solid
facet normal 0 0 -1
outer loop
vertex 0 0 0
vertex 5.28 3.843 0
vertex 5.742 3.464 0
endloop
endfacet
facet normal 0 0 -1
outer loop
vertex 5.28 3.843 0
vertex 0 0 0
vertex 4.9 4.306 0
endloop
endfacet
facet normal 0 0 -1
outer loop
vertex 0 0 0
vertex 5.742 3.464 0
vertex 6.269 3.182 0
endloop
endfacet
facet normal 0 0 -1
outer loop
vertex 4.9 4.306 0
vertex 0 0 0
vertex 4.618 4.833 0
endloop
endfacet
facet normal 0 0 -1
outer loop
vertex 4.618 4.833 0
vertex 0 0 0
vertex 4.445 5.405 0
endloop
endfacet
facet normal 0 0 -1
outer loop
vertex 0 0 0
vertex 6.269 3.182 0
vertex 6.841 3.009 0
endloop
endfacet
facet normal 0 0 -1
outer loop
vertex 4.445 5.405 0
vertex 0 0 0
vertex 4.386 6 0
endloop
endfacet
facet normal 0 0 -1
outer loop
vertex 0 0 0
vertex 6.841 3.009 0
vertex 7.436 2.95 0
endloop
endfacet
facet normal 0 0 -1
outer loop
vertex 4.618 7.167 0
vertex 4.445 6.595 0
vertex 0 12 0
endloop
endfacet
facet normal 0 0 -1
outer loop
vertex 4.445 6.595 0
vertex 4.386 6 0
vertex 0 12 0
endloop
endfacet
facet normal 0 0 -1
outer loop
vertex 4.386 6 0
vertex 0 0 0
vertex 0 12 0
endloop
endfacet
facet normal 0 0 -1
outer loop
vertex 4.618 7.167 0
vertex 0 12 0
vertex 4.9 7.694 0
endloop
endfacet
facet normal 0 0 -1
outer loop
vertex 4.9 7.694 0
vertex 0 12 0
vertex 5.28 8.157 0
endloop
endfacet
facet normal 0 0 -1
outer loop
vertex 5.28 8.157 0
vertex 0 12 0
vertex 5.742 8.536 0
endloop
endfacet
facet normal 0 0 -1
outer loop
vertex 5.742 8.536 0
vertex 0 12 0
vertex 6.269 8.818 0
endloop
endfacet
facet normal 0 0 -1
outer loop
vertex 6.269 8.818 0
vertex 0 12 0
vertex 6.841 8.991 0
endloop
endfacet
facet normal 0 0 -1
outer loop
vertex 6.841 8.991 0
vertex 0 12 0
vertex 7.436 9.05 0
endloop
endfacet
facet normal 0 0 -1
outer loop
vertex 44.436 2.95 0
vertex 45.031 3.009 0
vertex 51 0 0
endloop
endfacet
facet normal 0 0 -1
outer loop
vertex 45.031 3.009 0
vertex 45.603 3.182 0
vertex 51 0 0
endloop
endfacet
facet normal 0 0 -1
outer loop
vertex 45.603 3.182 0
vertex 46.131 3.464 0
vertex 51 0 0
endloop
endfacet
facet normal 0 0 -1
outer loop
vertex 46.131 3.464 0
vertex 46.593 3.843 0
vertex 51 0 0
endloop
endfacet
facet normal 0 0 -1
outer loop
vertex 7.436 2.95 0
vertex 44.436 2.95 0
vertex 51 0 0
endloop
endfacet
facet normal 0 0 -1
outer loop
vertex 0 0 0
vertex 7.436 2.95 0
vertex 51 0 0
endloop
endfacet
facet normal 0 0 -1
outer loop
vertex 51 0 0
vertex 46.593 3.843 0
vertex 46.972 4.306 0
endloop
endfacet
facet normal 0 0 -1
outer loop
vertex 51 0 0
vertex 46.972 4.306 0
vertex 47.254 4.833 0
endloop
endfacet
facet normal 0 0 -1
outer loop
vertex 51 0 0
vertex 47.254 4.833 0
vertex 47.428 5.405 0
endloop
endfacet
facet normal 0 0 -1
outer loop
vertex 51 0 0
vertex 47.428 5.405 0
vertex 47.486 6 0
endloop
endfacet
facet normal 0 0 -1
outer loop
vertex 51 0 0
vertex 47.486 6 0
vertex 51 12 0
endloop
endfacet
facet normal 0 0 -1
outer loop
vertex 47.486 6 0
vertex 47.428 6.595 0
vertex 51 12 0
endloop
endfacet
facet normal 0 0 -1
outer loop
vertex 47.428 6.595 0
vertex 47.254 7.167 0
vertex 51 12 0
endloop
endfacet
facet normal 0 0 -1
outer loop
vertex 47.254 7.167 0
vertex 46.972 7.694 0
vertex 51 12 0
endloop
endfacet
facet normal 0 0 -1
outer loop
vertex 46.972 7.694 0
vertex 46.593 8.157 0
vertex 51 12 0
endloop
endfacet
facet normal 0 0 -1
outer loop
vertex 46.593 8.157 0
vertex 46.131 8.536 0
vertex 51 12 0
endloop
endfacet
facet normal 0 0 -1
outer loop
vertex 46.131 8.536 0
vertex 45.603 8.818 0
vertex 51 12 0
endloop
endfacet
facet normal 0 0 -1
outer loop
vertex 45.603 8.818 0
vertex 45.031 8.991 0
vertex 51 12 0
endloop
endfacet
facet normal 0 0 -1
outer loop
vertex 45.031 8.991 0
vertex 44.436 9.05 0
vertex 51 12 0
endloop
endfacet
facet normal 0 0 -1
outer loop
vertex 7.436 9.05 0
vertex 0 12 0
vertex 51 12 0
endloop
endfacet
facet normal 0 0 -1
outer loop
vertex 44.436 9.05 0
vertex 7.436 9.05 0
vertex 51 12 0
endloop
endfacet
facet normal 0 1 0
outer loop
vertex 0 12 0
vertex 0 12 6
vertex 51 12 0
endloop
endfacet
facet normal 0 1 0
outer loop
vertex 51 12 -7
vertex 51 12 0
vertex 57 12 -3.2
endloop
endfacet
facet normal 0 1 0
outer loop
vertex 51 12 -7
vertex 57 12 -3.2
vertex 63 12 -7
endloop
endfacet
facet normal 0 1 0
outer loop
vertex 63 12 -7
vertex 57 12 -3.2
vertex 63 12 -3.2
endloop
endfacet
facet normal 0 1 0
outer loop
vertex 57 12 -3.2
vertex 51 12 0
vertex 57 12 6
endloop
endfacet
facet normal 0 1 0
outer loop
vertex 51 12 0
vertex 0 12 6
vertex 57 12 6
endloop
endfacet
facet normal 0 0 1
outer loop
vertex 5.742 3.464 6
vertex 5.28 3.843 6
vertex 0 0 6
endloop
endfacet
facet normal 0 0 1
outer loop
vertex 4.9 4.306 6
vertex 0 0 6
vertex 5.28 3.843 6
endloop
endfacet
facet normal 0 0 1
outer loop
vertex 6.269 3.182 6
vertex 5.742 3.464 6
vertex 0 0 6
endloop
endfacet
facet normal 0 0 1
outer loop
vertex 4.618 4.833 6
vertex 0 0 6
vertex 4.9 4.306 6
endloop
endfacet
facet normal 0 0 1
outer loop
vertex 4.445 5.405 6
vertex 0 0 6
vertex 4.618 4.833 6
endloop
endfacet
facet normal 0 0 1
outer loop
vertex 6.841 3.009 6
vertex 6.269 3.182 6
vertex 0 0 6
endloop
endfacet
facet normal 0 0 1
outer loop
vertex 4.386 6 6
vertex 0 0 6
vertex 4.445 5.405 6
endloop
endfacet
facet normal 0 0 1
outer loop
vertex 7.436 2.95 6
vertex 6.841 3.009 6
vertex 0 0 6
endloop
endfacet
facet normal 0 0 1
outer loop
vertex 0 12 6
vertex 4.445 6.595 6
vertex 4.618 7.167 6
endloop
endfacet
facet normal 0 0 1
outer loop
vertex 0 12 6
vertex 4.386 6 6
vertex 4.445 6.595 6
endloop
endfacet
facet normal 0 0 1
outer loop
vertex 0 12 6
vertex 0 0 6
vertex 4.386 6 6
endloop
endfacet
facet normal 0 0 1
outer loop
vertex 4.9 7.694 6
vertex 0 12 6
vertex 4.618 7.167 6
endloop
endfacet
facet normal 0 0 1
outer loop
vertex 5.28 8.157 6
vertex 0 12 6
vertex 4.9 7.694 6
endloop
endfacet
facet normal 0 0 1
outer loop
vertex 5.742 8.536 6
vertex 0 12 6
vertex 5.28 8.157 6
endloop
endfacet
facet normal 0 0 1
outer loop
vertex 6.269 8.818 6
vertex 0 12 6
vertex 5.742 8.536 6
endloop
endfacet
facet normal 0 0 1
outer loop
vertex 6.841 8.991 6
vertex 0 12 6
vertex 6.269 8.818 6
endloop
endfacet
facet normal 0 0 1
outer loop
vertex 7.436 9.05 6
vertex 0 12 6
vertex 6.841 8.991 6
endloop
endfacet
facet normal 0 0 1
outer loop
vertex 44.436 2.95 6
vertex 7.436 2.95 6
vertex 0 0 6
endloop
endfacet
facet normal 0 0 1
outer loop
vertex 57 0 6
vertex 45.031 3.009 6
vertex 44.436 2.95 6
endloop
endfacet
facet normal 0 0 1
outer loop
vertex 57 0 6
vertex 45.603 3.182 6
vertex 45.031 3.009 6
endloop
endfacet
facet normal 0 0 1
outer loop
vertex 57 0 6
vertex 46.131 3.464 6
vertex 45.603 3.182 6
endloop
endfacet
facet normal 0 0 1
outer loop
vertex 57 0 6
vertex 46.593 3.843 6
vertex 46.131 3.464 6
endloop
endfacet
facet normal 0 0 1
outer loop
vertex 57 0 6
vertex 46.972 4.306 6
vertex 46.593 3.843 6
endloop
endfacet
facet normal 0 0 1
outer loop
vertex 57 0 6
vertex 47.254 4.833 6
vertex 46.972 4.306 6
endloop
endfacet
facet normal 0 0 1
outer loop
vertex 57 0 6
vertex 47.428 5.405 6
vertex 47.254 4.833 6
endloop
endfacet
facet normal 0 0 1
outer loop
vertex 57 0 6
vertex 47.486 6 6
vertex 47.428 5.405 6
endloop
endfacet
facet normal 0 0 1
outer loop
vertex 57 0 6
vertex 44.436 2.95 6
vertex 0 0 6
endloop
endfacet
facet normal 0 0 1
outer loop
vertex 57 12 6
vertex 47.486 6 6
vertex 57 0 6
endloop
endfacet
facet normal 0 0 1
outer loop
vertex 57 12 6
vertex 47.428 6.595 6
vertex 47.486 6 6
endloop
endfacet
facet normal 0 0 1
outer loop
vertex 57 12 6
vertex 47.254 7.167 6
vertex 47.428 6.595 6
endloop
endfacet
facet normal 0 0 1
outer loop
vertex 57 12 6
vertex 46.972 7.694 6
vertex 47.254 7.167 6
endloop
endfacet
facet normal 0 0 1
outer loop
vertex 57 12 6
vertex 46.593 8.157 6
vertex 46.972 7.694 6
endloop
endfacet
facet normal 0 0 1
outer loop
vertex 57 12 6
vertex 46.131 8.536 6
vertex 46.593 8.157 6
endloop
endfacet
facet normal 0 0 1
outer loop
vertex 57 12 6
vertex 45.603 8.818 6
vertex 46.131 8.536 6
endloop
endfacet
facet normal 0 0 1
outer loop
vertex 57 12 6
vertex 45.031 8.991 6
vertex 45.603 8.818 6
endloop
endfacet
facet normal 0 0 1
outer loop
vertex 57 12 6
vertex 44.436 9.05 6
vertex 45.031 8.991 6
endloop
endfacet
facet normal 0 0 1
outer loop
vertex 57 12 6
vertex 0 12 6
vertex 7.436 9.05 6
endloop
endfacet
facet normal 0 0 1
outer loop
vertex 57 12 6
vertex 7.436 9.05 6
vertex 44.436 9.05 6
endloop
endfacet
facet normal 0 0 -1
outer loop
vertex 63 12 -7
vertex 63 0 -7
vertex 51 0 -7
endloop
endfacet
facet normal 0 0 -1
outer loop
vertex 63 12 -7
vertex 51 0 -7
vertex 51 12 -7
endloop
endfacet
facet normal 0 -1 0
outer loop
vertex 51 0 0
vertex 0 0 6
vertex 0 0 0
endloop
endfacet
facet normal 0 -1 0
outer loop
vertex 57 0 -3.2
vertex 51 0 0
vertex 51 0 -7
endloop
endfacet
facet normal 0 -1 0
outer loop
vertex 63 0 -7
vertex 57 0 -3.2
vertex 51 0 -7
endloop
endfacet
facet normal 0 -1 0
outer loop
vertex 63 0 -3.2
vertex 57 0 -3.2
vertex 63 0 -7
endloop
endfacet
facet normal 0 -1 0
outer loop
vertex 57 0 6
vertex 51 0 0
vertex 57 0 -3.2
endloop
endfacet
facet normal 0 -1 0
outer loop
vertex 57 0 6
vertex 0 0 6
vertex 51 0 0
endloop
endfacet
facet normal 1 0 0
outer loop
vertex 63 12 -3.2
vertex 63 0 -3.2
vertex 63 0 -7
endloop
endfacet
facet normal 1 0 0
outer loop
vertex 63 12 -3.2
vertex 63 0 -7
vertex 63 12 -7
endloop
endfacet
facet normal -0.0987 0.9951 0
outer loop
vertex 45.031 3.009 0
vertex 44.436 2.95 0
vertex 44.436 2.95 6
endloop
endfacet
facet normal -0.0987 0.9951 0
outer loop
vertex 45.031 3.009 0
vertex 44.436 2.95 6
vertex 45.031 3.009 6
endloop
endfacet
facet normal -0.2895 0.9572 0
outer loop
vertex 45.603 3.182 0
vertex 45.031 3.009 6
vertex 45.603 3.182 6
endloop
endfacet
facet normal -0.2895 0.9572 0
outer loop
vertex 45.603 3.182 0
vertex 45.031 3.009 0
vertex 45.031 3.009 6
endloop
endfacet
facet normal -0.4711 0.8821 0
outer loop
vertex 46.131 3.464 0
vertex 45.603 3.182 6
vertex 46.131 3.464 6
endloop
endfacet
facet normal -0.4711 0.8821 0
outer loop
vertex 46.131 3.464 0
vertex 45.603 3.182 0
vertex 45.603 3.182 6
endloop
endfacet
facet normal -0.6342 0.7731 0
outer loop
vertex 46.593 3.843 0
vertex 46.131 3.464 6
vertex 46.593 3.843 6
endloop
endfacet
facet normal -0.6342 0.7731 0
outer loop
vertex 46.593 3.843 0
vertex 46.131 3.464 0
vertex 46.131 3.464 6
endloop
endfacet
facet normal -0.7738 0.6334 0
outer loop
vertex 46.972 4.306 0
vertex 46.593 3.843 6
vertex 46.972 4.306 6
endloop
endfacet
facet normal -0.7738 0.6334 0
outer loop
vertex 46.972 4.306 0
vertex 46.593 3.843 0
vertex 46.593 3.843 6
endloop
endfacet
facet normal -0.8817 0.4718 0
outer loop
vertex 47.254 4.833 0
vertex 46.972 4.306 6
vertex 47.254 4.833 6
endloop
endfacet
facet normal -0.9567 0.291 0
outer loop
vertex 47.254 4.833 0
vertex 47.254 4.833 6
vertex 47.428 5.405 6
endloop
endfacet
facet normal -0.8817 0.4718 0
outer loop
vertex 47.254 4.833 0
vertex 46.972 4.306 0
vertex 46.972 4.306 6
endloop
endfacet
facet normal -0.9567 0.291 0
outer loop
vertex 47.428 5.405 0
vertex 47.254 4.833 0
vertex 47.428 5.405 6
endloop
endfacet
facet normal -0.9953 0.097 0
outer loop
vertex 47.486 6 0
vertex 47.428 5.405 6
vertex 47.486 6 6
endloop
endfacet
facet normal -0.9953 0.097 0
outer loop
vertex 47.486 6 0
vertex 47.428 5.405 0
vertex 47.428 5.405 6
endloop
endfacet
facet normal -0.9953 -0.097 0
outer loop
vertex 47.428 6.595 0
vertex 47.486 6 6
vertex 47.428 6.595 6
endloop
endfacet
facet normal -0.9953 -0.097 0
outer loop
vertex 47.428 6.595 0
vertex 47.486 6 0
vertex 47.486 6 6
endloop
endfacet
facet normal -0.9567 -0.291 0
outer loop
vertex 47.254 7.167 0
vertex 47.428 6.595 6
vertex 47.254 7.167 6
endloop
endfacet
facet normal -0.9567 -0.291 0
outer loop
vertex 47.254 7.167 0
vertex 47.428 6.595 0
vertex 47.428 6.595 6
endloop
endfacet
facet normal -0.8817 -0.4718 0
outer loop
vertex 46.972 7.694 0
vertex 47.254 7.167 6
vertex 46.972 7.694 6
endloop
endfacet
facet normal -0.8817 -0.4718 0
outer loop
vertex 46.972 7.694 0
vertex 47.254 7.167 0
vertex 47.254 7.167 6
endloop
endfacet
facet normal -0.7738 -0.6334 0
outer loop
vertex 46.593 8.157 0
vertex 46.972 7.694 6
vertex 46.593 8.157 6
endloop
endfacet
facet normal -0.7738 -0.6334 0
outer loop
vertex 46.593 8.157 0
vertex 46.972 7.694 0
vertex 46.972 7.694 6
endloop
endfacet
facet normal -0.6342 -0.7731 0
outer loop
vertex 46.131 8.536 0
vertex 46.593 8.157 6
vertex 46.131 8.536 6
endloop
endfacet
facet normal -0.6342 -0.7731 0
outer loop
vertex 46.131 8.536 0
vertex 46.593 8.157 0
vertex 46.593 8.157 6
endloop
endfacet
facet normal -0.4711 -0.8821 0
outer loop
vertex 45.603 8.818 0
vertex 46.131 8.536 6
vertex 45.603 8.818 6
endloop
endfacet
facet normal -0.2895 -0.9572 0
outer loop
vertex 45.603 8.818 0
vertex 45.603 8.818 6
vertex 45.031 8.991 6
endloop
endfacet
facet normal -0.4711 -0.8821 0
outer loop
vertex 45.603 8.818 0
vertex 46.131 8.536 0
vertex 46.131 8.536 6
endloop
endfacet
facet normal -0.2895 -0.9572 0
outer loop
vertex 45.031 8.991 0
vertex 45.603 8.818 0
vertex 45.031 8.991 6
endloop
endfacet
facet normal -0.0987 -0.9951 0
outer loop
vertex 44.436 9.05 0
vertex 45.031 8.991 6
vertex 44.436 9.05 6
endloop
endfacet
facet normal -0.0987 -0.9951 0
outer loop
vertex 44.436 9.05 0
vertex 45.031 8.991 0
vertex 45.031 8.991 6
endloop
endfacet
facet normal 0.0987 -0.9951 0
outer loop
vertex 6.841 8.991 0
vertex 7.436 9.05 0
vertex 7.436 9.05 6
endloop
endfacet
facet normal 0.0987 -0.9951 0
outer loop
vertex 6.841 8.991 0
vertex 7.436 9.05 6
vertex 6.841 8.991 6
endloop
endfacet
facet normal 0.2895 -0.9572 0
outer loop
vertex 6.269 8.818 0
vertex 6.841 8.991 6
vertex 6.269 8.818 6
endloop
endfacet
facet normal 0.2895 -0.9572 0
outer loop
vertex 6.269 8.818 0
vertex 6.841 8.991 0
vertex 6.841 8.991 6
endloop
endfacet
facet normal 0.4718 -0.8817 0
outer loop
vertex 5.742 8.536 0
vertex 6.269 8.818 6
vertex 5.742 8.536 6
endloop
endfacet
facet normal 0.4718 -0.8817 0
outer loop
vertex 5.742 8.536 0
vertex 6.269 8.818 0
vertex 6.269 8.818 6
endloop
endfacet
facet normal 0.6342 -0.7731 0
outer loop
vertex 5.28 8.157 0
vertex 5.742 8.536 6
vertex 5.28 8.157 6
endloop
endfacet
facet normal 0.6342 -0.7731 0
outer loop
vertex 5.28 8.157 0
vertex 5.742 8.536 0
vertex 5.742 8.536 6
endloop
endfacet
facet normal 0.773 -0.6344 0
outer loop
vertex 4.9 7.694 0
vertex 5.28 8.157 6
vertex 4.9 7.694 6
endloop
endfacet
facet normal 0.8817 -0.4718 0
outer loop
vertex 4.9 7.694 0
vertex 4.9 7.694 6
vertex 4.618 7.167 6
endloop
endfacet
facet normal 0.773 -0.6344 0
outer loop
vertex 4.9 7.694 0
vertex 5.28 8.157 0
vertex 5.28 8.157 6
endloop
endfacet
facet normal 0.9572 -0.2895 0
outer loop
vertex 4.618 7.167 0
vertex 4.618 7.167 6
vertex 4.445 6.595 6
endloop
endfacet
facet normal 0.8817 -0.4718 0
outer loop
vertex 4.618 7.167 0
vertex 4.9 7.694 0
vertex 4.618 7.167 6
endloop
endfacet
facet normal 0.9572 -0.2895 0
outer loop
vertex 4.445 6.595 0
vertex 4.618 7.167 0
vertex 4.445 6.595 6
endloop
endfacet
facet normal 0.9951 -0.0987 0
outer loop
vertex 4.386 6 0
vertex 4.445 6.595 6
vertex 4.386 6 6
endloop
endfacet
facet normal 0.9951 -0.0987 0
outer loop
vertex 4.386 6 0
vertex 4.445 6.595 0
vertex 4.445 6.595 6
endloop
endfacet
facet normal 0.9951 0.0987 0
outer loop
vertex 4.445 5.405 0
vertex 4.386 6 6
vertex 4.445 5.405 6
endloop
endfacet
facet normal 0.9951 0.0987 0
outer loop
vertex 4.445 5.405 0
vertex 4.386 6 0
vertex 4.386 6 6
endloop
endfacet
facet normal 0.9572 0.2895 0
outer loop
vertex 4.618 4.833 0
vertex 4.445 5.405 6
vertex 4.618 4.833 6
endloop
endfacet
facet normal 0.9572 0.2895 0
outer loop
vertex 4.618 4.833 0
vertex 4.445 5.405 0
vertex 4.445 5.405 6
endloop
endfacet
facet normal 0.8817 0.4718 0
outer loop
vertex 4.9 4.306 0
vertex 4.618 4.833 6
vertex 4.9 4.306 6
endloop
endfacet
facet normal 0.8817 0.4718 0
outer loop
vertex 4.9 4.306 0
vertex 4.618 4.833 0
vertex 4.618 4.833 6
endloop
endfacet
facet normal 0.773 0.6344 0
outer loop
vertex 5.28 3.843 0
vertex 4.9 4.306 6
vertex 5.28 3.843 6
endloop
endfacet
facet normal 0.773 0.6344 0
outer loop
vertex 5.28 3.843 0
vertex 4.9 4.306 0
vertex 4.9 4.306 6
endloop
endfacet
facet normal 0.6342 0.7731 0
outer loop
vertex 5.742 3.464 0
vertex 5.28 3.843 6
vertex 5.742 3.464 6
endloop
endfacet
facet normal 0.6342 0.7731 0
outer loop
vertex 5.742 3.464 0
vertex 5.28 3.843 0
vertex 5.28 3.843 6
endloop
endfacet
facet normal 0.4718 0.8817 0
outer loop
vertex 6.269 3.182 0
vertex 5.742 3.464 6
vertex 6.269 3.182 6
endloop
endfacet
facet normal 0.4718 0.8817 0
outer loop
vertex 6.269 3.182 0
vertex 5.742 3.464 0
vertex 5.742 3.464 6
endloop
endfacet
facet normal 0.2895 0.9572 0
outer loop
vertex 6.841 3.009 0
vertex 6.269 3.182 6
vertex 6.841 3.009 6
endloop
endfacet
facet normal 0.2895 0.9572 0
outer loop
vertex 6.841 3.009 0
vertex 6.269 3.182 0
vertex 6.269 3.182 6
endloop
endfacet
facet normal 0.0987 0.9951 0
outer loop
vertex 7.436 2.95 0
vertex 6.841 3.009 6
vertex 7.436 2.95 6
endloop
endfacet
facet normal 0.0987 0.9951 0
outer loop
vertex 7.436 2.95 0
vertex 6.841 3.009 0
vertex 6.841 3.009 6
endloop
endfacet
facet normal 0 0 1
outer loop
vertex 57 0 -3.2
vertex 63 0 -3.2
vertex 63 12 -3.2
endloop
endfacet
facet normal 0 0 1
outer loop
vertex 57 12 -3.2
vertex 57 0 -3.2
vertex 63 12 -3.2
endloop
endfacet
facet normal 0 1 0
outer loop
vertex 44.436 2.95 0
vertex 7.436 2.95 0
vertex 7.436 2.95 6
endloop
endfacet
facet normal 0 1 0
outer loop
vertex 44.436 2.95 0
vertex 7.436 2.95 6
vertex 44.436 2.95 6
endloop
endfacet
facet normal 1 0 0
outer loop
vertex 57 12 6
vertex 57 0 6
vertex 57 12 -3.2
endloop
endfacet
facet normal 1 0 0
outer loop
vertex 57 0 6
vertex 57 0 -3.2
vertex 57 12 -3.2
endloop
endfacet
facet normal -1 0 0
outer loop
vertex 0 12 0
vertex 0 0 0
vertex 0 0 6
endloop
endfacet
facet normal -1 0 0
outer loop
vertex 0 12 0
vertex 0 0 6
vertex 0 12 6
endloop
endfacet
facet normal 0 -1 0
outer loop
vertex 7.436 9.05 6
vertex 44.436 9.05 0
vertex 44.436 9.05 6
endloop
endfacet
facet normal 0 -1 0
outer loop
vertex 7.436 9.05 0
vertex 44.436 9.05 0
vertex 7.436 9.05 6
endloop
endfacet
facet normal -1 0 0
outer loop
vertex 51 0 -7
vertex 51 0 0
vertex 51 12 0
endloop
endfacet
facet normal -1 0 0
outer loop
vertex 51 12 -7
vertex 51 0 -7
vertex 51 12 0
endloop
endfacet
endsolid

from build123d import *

# Parameters (mm, degrees)
SKETCH_W     = 57
SKETCH_H     = 12
PAD_DEPTH    = 6
BOX_W        = 12
BOX_H        = 12
BOX_DEPTH    = 7
BOX001_W     = 12
BOX001_H     = 6
BOX001_DEPTH = 3.2


with BuildPart() as part:
    # Sketch → Pad (new body)
    with BuildSketch(Plane.XY):
        with Locations((28.5, 6)):
            Rectangle(SKETCH_W, SKETCH_H)
        with BuildLine():
            Line((44.436229, 9.05), (7.436229, 9.05))
            ThreePointArc((7.436229, 9.05), (4.386229, 6), (7.436229, 2.95))
            Line((7.436229, 2.95), (44.436229, 2.95))
            ThreePointArc((44.436229, 2.95), (47.486229, 6), (44.436229, 9.05))
        make_face(mode=Mode.SUBTRACT)
    extrude(amount=PAD_DEPTH)

    # Box → Box (join)
    with BuildSketch(Plane(origin=(51, 0, 0), x_dir=(0, 1, 0), z_dir=(0, 0, -1))):
        with Locations((6, 6)):
            Rectangle(BOX_W, BOX_H)
    extrude(amount=BOX_DEPTH)

    # Box001 → Box001 (cut)
    with BuildSketch(Plane(origin=(57, 0, 0), x_dir=(0, 1, 0), z_dir=(0, 0, -1))):
        with Locations((6, 3)):
            Rectangle(BOX001_W, BOX001_H)
    extrude(amount=BOX001_DEPTH, mode=Mode.SUBTRACT)


solid = part.part
